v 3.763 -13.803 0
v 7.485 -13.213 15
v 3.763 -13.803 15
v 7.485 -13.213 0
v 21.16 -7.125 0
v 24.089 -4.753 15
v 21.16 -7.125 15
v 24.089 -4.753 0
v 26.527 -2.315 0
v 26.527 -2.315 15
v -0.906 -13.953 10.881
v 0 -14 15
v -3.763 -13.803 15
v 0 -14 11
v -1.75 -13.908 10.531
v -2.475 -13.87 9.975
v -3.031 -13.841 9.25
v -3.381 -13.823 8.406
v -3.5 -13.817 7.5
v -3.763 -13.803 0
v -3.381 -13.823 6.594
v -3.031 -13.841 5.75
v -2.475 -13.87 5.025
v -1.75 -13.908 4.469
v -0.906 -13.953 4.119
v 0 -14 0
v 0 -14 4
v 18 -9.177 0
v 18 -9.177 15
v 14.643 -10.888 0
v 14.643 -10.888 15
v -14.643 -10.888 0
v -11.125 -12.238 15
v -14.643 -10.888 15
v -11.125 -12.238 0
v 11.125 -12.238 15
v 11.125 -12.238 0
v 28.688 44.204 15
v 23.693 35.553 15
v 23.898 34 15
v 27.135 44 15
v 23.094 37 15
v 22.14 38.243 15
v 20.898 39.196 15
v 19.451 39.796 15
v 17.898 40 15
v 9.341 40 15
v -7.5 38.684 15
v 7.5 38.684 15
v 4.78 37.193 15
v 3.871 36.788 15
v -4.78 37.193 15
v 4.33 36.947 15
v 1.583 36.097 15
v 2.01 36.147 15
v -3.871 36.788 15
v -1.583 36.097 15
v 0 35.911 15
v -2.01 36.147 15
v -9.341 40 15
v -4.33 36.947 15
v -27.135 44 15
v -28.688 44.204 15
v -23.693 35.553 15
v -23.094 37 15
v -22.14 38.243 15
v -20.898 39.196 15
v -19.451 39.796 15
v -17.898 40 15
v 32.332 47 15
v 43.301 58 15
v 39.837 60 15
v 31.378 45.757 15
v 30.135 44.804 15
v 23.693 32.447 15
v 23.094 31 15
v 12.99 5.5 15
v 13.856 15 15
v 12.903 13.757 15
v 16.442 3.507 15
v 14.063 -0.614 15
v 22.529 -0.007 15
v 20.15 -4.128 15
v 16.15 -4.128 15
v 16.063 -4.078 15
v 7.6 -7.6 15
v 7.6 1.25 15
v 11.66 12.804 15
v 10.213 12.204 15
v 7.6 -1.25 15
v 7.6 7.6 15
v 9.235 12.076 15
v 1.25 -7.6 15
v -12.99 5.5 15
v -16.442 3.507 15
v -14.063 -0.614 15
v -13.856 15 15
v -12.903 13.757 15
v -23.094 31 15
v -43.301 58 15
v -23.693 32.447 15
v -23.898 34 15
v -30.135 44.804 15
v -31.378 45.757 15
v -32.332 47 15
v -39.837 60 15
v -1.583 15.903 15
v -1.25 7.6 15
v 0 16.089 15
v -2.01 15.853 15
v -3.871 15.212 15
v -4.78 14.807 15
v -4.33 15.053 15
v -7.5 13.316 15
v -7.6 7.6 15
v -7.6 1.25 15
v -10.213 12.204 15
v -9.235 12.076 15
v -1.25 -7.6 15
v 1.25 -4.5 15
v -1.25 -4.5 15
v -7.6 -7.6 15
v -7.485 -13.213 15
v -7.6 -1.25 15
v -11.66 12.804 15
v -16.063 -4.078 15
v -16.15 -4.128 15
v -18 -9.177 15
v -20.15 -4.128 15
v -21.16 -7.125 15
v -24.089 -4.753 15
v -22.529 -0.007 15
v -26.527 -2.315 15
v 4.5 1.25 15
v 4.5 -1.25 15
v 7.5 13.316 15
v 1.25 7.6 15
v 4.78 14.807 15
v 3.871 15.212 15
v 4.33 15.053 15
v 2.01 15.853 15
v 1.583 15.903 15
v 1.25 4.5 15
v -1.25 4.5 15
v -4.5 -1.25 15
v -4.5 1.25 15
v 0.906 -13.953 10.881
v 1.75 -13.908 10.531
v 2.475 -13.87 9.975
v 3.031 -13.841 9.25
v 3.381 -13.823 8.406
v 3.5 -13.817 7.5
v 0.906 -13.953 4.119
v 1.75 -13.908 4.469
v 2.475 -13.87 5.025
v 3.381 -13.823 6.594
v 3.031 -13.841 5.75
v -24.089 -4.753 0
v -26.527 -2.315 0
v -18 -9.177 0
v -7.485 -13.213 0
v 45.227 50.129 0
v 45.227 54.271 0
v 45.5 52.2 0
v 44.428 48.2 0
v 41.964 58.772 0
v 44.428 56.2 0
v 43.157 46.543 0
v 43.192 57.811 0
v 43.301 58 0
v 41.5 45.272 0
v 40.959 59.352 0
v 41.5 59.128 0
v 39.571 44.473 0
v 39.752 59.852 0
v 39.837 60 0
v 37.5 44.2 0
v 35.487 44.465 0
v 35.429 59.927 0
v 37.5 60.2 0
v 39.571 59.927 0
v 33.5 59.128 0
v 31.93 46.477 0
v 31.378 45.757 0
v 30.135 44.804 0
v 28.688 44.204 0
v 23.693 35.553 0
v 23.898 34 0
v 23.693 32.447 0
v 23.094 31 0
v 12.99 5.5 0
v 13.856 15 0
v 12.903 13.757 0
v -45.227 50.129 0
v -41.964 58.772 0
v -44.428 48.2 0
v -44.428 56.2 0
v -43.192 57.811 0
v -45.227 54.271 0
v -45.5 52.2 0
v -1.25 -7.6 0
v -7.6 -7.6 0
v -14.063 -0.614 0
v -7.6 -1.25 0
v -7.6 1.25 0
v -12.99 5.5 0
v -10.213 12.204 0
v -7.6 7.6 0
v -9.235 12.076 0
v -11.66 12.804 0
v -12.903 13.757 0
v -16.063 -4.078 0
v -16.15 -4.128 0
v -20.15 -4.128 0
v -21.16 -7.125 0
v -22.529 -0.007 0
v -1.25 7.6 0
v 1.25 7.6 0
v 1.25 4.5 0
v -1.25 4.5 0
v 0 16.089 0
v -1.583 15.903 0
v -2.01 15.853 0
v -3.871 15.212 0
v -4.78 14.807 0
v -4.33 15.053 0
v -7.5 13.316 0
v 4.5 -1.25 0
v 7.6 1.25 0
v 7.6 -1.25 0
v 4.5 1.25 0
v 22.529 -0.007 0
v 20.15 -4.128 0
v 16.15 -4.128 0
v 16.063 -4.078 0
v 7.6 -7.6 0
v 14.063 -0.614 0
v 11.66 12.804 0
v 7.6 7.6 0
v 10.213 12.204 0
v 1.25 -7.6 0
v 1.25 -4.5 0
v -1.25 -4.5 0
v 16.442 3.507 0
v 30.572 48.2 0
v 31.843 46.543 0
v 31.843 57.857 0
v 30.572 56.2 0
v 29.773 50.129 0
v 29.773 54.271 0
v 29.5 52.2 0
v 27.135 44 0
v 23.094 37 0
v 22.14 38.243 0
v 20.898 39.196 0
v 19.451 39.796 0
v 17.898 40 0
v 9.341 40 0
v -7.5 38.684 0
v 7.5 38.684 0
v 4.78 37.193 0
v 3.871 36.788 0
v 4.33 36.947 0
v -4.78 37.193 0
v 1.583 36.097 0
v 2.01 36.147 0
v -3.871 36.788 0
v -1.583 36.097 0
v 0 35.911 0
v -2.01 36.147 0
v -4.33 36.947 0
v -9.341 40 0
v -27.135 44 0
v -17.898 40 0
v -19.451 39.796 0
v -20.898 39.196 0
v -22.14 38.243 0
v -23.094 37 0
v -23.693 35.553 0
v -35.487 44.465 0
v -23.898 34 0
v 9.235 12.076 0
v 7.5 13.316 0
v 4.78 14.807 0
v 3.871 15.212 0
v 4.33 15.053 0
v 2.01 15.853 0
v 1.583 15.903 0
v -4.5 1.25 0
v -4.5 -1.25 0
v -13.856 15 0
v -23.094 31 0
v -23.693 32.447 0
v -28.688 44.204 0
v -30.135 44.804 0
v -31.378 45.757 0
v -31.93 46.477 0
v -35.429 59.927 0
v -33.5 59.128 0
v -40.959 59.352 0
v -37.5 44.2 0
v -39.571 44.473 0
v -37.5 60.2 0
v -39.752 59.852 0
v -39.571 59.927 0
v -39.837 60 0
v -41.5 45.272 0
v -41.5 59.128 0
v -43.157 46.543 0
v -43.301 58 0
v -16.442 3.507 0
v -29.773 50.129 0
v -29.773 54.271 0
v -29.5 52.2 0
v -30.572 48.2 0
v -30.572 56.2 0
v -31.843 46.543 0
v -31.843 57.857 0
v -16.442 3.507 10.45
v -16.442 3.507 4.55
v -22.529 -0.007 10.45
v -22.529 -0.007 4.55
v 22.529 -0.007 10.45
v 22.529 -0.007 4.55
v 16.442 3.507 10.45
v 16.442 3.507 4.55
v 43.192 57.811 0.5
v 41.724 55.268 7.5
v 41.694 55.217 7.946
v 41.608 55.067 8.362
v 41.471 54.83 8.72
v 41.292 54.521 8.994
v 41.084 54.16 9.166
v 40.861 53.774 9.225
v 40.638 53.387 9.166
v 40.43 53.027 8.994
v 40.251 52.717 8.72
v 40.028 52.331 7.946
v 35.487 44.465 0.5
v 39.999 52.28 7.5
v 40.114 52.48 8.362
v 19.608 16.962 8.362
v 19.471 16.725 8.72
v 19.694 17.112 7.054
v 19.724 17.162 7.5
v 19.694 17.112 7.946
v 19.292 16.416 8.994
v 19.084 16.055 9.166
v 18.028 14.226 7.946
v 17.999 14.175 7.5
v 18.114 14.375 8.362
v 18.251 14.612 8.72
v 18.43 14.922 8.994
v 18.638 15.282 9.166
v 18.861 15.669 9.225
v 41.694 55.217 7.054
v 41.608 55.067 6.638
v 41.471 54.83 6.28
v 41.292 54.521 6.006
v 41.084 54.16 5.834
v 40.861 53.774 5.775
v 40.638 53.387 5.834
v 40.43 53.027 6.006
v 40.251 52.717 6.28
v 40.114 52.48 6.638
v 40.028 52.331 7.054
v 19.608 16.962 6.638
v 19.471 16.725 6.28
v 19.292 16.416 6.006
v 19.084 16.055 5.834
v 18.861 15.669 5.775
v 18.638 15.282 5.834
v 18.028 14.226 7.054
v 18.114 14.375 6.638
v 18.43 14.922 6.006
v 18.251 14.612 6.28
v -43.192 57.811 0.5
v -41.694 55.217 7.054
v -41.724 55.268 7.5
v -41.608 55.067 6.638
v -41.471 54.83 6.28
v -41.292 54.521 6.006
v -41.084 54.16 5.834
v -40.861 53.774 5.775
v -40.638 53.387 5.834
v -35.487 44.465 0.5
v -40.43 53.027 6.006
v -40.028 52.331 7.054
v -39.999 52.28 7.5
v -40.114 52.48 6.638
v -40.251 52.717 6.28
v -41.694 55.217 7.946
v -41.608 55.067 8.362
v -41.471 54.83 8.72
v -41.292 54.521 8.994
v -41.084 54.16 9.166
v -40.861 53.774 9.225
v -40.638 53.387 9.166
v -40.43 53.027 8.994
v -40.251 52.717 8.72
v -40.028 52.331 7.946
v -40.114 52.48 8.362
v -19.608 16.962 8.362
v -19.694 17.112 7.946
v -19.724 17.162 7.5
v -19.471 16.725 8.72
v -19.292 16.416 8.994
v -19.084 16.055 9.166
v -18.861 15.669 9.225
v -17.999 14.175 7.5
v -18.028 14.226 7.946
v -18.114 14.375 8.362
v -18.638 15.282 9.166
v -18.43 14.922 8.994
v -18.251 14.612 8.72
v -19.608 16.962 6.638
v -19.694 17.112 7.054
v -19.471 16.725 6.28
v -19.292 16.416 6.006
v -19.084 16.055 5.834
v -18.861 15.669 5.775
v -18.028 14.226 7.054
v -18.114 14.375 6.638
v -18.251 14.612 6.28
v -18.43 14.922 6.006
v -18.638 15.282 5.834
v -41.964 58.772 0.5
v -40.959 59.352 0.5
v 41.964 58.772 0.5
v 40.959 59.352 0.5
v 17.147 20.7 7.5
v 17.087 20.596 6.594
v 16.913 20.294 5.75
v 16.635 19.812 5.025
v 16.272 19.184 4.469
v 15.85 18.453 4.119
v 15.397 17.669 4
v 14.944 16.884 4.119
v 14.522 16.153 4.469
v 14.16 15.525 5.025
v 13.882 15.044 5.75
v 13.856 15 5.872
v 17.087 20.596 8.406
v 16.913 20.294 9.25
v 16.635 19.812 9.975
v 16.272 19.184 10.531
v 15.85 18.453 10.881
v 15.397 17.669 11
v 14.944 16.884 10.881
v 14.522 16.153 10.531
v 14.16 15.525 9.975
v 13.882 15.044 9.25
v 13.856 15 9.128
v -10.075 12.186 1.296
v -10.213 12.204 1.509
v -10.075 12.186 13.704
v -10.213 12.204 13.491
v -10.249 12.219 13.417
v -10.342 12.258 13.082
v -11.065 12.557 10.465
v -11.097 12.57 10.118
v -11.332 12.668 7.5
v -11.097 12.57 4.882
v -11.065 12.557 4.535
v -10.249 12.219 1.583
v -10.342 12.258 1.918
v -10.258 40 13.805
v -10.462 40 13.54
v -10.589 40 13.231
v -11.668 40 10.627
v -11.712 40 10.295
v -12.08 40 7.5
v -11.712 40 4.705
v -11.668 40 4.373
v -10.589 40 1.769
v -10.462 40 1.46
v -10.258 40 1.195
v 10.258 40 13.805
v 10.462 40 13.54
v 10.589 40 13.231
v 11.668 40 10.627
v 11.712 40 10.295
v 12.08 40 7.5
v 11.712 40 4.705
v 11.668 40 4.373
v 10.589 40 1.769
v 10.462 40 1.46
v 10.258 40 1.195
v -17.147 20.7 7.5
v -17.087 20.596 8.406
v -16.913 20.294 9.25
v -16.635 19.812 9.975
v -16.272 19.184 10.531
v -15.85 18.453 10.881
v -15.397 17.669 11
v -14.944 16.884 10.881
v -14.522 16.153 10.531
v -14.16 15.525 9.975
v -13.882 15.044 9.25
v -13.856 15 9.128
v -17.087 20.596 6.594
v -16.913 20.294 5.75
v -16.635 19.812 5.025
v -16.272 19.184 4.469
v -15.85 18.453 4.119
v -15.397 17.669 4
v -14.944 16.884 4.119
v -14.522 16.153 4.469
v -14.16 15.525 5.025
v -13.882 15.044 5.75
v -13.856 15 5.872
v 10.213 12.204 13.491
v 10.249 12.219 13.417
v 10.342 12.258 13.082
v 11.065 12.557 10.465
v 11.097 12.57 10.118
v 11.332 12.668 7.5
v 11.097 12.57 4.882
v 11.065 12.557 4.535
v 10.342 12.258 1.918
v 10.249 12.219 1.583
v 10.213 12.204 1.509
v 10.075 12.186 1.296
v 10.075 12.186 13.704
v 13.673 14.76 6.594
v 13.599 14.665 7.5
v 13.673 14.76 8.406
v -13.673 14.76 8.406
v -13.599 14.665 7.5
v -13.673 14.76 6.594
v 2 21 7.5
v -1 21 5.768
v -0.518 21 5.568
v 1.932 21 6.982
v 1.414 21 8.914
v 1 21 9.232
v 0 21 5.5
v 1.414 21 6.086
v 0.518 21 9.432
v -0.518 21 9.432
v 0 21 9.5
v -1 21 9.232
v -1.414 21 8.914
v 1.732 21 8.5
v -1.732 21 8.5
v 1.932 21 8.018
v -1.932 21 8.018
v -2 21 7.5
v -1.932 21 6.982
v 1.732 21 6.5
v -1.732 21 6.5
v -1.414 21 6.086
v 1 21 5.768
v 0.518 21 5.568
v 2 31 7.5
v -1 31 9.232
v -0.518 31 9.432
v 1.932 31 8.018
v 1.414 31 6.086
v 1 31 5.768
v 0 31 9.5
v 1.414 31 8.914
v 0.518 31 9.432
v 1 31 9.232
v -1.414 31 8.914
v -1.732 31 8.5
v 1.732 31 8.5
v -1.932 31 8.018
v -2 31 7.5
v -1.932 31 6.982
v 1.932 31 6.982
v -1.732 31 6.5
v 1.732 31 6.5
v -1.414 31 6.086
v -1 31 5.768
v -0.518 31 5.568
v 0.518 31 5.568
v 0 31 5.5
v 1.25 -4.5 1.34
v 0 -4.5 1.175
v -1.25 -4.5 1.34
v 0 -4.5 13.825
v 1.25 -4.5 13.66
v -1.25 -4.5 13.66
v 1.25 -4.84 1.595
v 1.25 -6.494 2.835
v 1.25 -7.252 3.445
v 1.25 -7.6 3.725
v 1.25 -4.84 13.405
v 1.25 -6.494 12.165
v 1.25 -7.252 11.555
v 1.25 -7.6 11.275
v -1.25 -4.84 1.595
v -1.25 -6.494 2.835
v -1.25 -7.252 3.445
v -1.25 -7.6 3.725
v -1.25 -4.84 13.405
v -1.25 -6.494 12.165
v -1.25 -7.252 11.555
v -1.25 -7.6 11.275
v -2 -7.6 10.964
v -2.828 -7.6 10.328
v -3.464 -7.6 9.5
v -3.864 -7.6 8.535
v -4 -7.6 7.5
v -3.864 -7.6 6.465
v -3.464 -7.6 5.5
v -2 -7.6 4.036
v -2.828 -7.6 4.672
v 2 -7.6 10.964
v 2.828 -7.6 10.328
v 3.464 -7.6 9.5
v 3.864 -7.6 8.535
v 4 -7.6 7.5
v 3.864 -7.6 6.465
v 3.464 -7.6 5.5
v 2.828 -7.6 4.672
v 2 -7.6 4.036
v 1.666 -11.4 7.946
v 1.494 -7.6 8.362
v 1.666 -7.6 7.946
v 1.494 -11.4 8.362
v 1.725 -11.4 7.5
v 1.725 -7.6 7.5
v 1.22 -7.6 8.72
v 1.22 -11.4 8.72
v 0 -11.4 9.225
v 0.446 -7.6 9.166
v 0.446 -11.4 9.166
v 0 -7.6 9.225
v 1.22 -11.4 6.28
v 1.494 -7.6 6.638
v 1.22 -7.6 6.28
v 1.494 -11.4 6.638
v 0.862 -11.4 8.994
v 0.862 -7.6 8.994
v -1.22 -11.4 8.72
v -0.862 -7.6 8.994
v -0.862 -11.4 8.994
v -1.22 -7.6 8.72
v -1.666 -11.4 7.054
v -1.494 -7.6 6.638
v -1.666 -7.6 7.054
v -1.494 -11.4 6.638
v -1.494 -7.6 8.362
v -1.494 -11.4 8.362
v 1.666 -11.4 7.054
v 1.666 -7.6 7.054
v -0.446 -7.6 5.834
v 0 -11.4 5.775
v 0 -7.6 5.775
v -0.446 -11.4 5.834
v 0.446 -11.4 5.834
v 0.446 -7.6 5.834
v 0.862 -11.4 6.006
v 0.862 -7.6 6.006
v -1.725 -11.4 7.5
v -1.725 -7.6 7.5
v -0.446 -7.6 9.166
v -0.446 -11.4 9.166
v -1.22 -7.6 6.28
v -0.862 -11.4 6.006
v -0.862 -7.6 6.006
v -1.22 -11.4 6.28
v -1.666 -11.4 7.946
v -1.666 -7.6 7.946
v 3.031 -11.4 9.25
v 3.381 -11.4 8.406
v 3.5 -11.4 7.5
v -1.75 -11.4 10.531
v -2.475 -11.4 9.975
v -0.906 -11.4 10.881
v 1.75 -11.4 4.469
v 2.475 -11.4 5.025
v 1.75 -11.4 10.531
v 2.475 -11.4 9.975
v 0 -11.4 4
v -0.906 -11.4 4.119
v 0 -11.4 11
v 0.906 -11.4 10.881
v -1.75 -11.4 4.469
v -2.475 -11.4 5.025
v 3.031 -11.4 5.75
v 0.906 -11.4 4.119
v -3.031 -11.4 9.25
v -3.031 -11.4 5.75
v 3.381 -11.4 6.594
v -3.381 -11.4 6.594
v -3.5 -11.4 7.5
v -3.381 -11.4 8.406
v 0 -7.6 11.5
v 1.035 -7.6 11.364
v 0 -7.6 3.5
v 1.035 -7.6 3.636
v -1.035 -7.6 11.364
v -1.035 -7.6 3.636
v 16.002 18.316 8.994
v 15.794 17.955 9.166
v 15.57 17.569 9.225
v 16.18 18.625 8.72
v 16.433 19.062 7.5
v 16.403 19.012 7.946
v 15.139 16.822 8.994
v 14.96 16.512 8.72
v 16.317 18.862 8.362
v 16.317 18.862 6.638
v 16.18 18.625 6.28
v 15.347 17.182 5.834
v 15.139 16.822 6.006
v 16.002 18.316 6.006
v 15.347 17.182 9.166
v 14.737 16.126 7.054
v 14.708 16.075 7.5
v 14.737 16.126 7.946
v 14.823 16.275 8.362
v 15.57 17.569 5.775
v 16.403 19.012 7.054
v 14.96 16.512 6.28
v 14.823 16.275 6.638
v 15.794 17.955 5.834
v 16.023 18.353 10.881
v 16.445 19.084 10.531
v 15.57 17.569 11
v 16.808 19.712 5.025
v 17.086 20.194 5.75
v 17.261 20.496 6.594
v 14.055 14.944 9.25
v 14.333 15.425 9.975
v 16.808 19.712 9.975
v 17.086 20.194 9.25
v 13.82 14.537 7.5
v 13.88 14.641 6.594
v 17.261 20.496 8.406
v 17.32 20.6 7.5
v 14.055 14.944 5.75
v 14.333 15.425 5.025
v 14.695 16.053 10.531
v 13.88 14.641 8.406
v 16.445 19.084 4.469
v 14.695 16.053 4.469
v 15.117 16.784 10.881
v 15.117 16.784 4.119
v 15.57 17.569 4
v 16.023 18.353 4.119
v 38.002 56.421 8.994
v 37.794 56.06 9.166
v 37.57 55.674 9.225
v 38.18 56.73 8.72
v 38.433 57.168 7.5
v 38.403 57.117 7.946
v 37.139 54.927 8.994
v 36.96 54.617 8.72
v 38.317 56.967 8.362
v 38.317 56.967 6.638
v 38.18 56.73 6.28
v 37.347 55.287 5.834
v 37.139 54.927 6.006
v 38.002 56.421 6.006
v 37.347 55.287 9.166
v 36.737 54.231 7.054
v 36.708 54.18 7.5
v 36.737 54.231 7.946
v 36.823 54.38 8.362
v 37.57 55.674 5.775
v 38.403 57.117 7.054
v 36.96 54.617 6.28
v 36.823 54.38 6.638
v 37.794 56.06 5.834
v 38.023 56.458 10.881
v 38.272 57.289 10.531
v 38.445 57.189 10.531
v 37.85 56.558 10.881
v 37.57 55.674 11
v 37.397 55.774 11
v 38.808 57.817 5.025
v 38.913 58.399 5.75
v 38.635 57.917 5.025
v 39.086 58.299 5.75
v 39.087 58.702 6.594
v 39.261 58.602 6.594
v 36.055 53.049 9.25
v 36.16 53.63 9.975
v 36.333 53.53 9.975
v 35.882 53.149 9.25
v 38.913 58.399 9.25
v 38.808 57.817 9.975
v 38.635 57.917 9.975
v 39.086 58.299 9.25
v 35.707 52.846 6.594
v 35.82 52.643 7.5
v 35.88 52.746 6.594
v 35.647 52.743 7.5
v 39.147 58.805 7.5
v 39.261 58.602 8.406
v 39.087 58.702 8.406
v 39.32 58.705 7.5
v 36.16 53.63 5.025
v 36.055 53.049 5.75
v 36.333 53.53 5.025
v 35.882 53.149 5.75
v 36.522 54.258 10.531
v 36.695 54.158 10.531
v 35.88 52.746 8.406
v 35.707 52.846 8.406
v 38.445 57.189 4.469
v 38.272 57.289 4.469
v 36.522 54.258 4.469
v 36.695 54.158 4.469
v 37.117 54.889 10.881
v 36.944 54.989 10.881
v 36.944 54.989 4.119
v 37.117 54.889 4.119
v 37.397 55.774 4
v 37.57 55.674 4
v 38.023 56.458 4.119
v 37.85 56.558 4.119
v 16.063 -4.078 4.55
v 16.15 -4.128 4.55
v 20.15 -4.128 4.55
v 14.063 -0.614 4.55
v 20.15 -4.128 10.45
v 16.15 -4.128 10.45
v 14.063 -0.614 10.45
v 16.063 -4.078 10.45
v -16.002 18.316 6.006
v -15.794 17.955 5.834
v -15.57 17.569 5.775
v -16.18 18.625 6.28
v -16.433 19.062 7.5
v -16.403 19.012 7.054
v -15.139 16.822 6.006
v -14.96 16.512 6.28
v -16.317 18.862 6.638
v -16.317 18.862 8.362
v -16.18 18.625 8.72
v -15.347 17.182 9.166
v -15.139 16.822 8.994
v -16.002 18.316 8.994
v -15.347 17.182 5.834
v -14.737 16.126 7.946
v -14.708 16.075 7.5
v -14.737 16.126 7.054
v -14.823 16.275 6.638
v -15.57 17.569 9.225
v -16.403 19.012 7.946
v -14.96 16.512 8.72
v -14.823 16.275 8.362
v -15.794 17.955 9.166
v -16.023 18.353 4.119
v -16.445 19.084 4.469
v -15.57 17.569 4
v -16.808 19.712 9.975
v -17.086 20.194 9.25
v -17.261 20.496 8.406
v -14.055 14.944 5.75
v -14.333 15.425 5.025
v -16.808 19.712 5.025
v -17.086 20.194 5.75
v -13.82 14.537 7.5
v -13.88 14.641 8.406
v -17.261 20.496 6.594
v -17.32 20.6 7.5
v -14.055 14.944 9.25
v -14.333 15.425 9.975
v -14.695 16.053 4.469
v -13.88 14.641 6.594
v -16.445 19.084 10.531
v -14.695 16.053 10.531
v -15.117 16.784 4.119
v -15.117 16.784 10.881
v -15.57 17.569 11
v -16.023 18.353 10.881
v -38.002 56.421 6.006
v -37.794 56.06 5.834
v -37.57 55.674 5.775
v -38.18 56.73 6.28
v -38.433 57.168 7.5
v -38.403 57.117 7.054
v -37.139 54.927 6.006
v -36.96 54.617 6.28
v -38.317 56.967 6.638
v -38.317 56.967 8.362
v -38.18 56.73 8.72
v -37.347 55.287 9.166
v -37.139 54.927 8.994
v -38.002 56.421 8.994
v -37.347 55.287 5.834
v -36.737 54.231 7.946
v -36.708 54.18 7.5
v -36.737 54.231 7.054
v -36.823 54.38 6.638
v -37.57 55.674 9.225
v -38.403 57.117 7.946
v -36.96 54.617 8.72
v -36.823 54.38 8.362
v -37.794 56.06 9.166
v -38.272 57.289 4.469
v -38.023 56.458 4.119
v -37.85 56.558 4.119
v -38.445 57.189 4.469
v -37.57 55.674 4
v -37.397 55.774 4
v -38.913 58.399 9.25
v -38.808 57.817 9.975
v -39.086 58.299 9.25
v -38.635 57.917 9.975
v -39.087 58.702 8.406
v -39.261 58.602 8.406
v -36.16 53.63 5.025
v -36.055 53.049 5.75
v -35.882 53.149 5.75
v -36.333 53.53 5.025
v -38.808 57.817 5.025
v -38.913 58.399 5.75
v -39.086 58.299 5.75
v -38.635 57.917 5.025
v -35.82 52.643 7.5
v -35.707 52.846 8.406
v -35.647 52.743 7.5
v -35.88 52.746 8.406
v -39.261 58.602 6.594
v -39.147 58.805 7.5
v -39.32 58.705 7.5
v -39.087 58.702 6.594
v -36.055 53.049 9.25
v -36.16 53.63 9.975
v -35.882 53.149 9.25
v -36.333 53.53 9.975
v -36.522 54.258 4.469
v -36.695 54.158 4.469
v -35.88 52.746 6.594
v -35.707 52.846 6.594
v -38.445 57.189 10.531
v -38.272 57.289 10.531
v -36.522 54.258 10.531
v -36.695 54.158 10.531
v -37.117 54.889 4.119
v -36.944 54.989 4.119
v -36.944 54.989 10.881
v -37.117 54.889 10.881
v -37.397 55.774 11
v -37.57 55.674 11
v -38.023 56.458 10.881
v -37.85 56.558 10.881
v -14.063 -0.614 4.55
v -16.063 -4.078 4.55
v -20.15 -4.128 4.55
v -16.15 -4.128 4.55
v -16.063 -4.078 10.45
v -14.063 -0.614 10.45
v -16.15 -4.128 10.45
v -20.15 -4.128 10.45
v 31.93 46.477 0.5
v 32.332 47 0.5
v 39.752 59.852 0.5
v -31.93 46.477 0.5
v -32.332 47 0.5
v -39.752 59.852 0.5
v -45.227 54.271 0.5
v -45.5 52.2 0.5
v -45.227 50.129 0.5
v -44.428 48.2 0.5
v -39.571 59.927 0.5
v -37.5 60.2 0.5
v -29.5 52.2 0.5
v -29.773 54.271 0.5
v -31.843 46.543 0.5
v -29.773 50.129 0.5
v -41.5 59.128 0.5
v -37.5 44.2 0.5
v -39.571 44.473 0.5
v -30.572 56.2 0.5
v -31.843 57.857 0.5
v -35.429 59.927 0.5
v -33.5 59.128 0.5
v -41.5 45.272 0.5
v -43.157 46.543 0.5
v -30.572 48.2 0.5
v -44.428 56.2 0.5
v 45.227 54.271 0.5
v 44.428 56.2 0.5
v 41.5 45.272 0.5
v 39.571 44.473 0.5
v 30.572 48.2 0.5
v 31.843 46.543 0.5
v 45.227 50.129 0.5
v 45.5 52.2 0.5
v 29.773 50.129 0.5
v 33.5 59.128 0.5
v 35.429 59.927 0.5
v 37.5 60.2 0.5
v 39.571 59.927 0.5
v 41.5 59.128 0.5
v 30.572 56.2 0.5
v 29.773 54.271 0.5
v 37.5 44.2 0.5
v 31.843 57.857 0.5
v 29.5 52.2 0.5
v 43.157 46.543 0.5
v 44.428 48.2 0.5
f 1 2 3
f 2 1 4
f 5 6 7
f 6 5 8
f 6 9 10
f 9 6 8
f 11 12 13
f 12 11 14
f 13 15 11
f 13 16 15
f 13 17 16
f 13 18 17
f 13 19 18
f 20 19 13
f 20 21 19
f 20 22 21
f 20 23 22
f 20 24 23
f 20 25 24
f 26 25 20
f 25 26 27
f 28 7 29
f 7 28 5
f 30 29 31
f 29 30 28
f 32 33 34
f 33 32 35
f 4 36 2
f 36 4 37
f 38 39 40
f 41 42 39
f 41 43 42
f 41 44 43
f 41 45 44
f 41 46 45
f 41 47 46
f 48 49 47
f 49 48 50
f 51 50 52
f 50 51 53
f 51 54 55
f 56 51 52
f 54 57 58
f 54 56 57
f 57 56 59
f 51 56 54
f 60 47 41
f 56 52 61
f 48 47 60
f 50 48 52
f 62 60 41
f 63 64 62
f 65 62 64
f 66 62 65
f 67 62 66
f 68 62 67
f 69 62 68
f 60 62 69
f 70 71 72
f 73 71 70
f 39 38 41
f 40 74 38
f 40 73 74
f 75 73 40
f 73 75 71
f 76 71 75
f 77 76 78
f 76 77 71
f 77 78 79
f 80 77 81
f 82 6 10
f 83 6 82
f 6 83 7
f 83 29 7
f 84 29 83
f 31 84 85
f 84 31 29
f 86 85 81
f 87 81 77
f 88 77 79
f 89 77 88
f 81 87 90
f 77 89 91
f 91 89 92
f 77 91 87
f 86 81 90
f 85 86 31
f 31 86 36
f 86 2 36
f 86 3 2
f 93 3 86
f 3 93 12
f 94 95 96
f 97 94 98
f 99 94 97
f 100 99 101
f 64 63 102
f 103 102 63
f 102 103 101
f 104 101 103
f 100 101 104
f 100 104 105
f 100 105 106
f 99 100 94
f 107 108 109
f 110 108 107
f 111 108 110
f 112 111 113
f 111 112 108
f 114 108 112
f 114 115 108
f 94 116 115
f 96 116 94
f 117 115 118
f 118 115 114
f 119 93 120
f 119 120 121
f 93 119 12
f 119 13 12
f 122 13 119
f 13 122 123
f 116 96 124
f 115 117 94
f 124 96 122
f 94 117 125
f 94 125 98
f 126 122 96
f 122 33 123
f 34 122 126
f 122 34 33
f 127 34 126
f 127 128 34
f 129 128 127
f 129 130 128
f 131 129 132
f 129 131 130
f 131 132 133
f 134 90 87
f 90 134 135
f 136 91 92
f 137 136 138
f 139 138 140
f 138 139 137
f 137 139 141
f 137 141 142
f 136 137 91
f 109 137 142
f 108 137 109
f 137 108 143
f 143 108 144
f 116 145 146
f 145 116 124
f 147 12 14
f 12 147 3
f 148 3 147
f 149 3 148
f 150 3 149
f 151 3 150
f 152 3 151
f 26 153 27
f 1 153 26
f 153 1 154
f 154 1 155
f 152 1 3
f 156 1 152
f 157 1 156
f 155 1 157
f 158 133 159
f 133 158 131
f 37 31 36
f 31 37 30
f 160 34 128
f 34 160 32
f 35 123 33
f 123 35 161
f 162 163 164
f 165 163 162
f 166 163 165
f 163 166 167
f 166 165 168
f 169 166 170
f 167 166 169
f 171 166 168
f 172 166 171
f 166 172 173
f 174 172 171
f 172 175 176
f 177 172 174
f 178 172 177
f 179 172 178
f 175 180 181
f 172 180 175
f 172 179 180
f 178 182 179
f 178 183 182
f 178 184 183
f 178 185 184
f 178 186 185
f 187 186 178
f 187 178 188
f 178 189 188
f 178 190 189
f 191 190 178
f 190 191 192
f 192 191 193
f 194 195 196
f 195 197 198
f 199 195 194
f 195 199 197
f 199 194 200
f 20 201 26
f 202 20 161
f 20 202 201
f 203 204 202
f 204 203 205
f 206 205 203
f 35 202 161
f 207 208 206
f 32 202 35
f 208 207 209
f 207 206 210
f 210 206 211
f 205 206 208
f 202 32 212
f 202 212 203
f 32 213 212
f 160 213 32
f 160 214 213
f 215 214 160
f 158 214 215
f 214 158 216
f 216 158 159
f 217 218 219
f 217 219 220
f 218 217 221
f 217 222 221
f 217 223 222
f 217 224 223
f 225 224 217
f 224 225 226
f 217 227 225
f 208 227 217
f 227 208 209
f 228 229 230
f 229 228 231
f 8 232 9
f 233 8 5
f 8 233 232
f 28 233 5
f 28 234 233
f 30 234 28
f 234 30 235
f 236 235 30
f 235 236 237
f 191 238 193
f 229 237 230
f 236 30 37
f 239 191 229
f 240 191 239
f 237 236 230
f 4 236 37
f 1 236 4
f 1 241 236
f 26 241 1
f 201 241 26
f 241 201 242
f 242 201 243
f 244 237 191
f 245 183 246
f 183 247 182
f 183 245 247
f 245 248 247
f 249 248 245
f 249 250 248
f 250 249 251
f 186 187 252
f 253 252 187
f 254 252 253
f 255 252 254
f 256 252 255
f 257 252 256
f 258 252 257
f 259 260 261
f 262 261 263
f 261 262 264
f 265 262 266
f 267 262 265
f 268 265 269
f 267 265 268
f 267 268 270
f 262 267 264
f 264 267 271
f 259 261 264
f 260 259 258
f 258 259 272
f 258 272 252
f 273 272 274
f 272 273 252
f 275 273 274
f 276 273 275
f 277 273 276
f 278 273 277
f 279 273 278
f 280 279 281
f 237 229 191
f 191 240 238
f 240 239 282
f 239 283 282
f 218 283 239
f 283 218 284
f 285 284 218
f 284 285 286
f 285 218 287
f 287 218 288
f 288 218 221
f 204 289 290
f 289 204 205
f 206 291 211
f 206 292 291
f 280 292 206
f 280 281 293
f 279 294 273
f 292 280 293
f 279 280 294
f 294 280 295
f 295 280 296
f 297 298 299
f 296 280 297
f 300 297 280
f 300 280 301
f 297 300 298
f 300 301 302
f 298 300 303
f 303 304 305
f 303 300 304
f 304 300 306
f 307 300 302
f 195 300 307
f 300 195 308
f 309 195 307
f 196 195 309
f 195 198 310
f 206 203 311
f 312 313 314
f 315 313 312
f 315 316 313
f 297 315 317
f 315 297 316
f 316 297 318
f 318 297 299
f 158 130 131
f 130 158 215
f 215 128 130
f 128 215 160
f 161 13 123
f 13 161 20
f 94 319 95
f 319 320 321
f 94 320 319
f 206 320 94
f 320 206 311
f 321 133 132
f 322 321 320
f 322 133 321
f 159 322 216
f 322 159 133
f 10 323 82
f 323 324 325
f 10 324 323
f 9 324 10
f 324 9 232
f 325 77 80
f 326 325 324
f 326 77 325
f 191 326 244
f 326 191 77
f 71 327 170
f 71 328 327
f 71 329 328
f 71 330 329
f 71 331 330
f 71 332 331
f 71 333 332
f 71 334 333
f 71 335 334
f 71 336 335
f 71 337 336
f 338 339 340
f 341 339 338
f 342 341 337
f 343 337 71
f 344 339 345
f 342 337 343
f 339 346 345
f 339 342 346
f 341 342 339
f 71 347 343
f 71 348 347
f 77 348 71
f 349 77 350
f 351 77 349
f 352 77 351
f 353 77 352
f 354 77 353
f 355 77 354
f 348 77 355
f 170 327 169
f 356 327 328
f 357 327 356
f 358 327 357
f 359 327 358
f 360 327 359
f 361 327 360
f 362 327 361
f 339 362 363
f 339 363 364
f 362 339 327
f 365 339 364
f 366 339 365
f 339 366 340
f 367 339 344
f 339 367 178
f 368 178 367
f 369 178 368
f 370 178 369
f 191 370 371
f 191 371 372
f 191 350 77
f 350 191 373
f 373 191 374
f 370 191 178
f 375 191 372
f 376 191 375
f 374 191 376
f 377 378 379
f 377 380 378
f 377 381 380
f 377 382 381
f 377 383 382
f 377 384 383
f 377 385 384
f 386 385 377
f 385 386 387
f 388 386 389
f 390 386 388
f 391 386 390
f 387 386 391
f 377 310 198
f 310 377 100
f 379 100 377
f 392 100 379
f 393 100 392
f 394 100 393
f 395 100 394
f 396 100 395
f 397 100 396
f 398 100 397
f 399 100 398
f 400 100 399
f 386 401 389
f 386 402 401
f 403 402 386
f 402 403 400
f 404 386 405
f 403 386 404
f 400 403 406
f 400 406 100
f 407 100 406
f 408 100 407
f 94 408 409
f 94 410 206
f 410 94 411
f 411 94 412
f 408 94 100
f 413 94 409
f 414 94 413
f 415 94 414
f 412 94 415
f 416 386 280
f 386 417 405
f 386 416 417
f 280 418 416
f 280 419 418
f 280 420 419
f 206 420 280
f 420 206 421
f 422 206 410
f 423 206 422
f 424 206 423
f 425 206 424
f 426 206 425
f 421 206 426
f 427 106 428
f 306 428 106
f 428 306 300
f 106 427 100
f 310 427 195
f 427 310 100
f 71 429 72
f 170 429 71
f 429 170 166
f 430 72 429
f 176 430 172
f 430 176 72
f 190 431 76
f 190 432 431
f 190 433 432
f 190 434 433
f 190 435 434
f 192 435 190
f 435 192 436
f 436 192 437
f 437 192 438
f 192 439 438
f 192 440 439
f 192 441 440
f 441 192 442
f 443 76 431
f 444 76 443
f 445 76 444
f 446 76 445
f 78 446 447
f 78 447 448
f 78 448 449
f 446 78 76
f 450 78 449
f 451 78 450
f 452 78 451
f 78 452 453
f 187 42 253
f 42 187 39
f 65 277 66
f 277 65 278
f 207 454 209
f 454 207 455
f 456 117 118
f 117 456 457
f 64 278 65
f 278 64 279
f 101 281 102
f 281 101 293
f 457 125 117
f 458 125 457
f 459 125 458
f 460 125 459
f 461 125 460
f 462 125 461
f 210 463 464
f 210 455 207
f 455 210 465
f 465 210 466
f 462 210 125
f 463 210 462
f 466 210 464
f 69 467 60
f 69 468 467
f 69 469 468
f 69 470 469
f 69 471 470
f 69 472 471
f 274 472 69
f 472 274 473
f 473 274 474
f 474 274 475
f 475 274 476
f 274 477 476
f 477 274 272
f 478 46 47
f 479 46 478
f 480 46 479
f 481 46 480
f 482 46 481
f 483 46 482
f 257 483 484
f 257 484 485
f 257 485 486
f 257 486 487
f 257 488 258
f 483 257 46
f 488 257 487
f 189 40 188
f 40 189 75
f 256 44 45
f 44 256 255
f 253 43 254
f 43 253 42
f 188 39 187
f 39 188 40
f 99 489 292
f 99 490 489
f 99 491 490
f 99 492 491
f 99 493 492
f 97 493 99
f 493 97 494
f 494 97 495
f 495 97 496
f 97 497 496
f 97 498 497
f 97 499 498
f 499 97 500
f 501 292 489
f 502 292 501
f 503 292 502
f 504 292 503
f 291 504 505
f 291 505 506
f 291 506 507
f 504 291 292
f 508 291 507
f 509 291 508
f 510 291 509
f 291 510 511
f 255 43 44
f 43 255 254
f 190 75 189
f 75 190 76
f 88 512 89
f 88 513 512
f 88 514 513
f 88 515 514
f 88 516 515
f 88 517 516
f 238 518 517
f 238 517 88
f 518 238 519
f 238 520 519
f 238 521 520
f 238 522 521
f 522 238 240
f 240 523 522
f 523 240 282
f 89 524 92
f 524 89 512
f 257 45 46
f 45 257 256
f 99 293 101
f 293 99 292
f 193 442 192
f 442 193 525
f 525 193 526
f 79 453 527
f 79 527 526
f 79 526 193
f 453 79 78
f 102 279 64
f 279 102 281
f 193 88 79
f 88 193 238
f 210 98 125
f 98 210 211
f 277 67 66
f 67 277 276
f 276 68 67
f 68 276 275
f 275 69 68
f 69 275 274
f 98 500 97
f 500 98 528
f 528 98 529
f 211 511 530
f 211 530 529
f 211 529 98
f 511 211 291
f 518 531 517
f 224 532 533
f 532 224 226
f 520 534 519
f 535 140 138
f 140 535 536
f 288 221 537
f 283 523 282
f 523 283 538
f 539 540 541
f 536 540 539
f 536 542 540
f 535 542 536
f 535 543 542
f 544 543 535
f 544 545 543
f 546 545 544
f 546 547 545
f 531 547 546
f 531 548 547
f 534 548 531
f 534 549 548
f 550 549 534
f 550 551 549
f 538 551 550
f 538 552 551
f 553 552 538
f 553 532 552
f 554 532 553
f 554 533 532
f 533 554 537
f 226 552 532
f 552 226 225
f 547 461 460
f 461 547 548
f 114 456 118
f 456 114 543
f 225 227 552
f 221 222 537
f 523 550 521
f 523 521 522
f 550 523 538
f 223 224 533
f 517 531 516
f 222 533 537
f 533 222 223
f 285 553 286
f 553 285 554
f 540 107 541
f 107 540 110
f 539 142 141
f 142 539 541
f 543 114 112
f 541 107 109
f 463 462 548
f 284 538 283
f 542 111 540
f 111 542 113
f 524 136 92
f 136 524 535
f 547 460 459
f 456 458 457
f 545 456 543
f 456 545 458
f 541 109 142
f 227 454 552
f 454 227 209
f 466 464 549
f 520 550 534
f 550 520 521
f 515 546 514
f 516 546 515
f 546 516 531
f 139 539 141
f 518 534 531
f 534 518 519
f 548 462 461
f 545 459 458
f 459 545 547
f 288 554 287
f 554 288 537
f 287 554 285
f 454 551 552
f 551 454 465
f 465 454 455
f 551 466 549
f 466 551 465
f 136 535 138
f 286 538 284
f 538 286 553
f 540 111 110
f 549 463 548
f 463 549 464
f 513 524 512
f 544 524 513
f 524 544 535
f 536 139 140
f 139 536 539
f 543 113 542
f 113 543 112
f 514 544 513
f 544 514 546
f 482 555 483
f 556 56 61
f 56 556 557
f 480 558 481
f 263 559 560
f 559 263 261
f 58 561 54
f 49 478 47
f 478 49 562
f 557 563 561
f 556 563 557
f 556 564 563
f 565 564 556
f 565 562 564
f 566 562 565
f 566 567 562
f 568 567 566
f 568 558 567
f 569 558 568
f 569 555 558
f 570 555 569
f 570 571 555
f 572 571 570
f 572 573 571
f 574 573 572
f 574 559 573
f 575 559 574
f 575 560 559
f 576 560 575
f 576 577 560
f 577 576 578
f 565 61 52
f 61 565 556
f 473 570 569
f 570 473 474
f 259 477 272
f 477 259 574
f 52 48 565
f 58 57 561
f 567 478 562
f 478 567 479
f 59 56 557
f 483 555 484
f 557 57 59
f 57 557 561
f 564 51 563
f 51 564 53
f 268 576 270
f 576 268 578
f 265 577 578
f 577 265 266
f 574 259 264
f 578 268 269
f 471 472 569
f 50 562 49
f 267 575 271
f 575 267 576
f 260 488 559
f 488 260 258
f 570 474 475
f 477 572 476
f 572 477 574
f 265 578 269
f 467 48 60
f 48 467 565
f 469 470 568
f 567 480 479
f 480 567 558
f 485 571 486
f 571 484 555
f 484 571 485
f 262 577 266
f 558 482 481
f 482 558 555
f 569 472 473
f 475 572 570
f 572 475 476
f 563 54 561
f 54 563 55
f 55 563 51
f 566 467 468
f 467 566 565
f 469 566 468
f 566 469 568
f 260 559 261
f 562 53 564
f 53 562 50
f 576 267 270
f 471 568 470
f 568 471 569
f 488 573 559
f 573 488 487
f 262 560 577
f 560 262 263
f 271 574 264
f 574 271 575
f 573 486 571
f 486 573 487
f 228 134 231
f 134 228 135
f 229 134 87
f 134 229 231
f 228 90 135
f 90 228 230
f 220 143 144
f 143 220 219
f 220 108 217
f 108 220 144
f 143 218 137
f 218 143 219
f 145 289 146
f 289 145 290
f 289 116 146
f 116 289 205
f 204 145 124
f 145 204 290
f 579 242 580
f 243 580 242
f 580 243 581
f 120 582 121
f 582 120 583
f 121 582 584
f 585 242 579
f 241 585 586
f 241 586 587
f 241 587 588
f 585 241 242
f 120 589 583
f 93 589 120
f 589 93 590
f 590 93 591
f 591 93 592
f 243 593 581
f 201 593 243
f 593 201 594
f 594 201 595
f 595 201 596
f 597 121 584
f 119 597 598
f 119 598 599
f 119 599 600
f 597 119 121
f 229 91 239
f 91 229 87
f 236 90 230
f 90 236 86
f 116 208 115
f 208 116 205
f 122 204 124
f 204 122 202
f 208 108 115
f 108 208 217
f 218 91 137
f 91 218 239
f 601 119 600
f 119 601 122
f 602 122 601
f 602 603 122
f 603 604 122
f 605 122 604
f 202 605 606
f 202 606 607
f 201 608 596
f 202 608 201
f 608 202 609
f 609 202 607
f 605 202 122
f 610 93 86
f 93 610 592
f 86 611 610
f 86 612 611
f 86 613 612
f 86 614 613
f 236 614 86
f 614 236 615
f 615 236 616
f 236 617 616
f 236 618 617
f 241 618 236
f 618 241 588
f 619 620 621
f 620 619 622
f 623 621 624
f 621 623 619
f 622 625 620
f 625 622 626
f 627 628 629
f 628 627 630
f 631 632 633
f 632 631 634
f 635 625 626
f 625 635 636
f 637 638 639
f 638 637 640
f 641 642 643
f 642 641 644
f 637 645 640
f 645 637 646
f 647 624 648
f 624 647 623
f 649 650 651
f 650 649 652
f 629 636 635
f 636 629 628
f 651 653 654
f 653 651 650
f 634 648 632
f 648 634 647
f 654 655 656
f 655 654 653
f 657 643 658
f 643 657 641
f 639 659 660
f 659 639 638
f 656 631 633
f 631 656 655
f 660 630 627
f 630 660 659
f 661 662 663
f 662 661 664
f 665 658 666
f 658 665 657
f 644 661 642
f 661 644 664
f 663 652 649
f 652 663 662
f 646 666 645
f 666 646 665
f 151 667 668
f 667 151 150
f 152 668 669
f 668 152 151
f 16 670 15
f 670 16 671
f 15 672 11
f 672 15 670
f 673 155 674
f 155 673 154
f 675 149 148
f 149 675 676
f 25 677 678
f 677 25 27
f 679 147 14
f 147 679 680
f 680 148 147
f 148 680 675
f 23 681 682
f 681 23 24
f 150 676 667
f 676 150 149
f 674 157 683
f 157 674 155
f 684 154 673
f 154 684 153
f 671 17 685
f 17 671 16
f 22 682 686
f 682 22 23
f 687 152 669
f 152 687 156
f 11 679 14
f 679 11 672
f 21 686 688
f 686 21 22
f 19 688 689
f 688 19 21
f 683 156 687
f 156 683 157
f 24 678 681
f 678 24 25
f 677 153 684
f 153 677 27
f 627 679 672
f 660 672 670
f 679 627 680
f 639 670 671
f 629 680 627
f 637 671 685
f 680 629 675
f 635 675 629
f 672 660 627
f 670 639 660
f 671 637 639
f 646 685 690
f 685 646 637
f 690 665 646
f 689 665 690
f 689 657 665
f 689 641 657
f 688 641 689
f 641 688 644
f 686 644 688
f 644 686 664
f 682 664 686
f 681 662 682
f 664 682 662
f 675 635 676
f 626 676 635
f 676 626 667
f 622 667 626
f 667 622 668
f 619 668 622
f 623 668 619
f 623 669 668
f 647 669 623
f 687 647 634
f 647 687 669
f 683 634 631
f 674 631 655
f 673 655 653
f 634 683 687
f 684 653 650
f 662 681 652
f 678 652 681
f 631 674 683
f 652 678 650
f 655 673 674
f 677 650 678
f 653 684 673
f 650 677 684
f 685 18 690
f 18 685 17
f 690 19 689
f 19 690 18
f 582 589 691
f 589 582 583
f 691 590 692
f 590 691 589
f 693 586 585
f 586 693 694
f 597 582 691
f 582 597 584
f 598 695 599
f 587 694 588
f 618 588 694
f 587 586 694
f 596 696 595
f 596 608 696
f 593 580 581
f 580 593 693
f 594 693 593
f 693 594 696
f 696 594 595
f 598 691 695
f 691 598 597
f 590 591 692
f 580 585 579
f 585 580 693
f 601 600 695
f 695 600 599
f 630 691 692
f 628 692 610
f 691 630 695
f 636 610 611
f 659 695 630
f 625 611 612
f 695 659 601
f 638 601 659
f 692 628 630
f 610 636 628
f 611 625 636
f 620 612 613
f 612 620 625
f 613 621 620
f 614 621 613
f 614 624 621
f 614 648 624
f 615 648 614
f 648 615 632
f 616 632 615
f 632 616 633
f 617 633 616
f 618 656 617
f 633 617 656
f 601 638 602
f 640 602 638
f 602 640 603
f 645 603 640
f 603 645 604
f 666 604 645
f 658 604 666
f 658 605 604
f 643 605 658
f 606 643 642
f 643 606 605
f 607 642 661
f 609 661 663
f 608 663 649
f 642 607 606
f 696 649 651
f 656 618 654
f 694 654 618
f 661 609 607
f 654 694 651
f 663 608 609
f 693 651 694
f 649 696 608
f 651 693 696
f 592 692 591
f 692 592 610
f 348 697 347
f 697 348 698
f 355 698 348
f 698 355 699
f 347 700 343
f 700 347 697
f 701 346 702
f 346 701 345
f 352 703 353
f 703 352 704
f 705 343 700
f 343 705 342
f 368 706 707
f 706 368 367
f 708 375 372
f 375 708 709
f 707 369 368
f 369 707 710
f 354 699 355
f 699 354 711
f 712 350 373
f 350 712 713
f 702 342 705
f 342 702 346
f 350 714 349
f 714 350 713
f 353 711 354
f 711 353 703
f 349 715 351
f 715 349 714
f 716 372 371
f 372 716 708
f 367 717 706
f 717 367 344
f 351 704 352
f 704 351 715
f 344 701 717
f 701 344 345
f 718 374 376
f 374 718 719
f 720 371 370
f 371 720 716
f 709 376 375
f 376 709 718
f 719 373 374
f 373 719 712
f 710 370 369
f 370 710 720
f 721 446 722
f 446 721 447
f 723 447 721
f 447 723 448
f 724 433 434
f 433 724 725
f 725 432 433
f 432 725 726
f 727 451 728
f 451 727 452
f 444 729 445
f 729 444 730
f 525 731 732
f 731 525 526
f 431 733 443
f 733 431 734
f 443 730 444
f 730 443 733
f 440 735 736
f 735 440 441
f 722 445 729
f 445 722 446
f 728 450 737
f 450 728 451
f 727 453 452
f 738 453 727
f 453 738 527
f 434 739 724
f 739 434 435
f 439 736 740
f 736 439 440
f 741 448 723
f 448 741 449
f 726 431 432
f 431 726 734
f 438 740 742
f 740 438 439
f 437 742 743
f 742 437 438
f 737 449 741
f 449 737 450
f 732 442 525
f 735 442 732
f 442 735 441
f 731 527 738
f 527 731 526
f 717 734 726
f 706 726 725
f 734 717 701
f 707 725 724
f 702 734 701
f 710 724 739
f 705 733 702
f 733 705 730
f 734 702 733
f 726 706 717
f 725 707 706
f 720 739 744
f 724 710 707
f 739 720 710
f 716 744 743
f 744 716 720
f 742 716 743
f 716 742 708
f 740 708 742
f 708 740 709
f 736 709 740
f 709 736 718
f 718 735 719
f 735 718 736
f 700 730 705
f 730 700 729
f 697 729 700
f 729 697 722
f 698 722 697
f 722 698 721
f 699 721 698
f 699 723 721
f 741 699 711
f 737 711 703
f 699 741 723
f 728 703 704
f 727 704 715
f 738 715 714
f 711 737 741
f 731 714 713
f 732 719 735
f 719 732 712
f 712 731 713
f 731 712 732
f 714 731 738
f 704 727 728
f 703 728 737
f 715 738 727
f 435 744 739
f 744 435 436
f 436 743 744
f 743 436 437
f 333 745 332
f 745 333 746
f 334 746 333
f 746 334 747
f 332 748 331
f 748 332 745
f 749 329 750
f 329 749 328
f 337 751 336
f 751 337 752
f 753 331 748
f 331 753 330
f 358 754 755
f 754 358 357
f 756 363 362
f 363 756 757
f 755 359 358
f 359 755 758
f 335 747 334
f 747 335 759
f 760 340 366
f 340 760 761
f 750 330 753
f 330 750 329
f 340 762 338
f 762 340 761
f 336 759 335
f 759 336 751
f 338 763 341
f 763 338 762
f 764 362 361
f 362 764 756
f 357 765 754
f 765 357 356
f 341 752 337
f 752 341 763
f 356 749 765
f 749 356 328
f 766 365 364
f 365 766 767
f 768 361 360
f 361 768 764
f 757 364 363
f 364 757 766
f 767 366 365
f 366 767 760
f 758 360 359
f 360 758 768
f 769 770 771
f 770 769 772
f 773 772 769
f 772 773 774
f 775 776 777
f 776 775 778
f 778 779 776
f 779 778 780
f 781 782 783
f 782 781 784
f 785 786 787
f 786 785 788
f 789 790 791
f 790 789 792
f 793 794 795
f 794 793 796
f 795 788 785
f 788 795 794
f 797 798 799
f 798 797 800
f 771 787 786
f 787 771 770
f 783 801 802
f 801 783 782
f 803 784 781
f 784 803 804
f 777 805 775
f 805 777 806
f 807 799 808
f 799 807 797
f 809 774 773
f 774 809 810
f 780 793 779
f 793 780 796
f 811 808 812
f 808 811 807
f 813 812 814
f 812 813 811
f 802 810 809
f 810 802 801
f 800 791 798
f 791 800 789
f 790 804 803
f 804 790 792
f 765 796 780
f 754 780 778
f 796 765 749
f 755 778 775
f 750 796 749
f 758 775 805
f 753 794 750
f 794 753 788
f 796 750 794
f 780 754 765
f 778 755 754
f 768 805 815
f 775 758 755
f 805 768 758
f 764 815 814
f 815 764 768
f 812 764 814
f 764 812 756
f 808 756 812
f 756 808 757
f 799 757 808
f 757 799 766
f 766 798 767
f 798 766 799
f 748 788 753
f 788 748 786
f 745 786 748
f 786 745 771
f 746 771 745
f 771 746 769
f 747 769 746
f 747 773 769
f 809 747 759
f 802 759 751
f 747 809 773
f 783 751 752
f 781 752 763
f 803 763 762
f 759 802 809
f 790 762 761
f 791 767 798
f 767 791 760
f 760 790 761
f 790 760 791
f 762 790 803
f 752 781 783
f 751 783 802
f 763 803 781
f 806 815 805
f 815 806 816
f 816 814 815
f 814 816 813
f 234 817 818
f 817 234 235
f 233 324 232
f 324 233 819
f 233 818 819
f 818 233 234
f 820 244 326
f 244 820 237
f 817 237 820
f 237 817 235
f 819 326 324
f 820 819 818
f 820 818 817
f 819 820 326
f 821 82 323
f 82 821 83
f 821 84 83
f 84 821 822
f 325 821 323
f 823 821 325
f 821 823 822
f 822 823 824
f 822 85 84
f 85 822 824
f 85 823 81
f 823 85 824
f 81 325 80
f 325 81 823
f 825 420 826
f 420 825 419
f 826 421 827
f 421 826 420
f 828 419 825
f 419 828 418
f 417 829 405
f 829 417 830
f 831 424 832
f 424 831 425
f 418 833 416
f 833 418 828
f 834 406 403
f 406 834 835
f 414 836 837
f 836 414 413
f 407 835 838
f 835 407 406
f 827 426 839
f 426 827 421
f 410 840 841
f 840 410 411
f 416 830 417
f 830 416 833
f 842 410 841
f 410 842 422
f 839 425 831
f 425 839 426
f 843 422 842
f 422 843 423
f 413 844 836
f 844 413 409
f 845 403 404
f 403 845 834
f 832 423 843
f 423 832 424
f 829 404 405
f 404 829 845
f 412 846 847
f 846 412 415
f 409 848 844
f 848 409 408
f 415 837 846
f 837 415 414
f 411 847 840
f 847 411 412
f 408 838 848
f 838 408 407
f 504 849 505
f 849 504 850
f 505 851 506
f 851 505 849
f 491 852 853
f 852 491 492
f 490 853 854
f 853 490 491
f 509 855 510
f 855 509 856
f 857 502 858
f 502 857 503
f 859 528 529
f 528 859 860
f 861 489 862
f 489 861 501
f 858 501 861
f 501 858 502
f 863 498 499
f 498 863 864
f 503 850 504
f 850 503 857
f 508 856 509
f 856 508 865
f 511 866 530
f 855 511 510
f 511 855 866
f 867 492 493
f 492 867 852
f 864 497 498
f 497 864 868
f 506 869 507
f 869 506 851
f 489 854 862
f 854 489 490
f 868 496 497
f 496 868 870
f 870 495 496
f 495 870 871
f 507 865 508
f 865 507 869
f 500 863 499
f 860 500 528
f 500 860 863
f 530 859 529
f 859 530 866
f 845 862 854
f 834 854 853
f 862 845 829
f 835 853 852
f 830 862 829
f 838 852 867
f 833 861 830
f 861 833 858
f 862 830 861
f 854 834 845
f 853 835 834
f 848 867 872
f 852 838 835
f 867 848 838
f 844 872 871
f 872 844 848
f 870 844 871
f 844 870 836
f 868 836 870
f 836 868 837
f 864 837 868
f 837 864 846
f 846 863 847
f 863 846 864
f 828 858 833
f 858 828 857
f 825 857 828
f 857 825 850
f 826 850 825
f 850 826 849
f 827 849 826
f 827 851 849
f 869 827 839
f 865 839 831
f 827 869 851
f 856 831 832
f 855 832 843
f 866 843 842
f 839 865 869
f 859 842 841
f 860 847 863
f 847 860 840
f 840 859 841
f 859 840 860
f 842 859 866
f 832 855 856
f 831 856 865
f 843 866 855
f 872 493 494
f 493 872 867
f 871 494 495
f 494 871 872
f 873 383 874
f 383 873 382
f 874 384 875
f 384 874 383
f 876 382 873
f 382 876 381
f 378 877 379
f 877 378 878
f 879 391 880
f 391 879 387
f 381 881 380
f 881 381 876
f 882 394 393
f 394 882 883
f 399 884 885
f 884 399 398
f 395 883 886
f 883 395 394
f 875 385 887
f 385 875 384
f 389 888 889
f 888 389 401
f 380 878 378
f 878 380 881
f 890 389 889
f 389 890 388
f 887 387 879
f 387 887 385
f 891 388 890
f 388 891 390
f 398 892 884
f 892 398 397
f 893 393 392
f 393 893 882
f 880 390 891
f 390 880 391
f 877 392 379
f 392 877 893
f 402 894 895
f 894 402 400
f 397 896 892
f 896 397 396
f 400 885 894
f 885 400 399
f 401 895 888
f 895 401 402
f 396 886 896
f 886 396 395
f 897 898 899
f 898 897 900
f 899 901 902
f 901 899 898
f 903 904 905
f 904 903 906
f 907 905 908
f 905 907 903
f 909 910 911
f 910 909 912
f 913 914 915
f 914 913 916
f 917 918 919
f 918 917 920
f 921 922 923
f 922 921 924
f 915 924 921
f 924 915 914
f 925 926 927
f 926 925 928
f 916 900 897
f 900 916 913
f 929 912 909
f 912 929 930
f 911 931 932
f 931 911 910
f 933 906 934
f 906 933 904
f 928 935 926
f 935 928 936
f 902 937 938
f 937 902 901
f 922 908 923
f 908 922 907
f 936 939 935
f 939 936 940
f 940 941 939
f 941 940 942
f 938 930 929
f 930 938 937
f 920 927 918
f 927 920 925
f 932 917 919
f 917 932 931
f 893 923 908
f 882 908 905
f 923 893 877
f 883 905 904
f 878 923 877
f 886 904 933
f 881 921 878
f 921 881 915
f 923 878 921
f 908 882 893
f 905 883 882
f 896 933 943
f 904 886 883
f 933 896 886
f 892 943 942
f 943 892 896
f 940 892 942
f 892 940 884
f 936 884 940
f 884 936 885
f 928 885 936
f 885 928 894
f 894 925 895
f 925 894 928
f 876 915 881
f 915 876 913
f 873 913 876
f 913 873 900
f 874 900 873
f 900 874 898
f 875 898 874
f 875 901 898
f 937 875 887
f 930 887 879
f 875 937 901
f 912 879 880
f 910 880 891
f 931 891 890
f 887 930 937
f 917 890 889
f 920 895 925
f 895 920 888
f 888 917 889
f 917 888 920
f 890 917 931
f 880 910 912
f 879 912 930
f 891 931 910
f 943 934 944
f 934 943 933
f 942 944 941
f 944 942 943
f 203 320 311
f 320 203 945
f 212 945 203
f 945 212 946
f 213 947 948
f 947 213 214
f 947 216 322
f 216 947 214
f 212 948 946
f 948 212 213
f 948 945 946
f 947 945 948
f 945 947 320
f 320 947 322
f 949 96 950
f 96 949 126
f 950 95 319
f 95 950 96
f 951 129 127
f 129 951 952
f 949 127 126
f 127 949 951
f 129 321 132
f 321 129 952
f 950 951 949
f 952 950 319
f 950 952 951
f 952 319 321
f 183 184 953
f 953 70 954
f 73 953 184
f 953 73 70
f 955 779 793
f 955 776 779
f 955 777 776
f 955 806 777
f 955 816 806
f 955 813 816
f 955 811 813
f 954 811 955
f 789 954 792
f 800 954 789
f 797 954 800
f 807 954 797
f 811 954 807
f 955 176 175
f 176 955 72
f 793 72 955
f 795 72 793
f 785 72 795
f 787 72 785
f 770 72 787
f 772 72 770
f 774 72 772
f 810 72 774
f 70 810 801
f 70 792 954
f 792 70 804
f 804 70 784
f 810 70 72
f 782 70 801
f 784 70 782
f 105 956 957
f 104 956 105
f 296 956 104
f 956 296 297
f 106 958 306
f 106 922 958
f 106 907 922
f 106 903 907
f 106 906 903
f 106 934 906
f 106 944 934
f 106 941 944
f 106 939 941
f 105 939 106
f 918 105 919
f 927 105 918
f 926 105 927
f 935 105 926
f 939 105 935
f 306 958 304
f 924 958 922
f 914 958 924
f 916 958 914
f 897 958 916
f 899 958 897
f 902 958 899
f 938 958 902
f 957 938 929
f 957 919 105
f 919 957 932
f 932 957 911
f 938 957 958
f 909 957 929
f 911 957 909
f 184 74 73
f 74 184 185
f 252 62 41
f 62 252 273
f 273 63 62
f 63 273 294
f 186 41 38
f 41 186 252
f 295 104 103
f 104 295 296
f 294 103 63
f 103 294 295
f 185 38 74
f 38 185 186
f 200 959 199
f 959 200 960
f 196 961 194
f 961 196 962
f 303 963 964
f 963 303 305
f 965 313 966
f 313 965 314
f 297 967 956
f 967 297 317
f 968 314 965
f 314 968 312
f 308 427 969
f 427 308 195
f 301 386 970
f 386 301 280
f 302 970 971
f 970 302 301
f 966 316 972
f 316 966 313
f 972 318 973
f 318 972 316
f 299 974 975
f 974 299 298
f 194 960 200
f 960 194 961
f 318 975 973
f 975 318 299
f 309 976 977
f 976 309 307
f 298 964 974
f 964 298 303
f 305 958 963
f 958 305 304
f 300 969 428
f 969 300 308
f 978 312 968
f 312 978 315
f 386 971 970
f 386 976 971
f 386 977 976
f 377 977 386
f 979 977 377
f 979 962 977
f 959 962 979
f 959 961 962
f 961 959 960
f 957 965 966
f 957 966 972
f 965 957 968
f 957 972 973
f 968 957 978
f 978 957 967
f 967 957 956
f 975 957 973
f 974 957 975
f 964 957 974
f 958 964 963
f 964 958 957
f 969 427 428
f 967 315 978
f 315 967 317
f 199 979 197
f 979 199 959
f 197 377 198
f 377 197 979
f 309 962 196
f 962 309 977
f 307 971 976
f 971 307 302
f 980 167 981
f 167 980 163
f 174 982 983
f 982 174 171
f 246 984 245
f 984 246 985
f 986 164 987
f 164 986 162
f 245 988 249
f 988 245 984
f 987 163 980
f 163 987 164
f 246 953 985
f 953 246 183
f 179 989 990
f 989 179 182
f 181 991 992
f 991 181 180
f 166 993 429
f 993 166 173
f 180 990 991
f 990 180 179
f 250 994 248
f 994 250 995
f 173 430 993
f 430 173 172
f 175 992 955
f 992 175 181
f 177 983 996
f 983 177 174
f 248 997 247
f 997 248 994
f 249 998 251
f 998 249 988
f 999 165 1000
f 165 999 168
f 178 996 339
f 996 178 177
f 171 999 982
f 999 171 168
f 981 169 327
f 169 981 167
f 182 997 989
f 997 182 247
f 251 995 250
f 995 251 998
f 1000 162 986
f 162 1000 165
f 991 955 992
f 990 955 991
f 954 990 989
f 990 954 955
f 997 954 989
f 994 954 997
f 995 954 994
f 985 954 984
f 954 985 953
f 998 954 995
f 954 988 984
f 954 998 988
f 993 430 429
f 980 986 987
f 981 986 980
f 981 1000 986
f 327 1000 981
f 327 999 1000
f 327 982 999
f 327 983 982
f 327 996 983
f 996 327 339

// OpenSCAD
// file: configuration.scad
// Increase this if your slicer or printer make holes too tight.
extra_radius = 0.1;

// OD = outside diameter, corner to corner.
m3_nut_od = 6.1;
m3_nut_radius = m3_nut_od/2 + 0.2 + extra_radius;
m3_washer_radius = 3.5 + extra_radius;

// Major diameter of metric 3mm thread.
m3_major = 2.85;
m3_radius = m3_major/2 + extra_radius;
m3_wide_radius = m3_major/2 + extra_radius + 0.2;
// For M3 holes that needs to be tapped in the plastic
m3_tap_radius = 2.5/2 + extra_radius;

// NEMA17 stepper motors.
motor_shaft_diameter = 5;
motor_shaft_radius = motor_shaft_diameter/2 + extra_radius;

// Frame brackets. M3x8mm screws work best with 3.6 mm brackets.
thickness = 3.6;

// OpenBeam or Misumi. Currently only 15x15 mm, but there is a plan
// to make models more parametric and allow 20x20 mm in the future.
extrusion = 15;

// Placement for the NEMA17 stepper motors.
motor_offset = 44;
motor_length = 47;
// main file
include <configuration.scad>;

$fn = 24;
roundness = 6;

module extrusion_cutout(h, extra) {
  difference() {
    cube([extrusion+extra, extrusion+extra, h], center=true);
    for (a = [0:90:359]) rotate([0, 0, a]) {
      translate([extrusion/2, 0, 0])
        cube([6, 2.5, h+1], center=true);
    }
  }
}

module screw_socket() {
  cylinder(r=m3_wide_radius, h=20, center=true);
  translate([0, 0, 3.8]) cylinder(r=3.5, h=5);
}

module screw_socket_cone() {
  union() {
    screw_socket();
    scale([1, 1, -1]) cylinder(r1=4, r2=7, h=4);
  }
}

module vertex(height, idler_offset, idler_space) {
  union() {
    // Pads to improve print bed adhesion for slim ends.
    translate([-37.5, 52.2, -height/2]) cylinder(r=8, h=0.5);
    translate([37.5, 52.2, -height/2]) cylinder(r=8, h=0.5);
    difference() {
      union() {
        // Outer wedge form
        intersection() {
          translate([0, 22, 0])
            cylinder(r=36, h=height, center=true, $fn=60);
          translate([0, -37, 0]) rotate([0, 0, 30])
            cylinder(r=50, h=height+1, center=true, $fn=6);
        }
        // Inner triangle form
        translate([0, 38, 0]) intersection() {
          rotate([0, 0, -90])
            cylinder(r=55, h=height, center=true, $fn=3);
          translate([0, 10, 0])
            cube([100, 100, 2*height], center=true);
          translate([0, -10, 0]) rotate([0, 0, 30])
            cylinder(r=55, h=height+1, center=true, $fn=6);
        }
      }
      // Internal cutout where motor shaft/idler bearings sits.
      difference() {
        translate([0, 58, 0]) minkowski() {
          intersection() {
            rotate([0, 0, -90])
              cylinder(r=55, h=height, center=true, $fn=3);
            translate([0, -32, 0])
              cube([100, 16, 2*height], center=true);
          }
          cylinder(r=roundness, h=1, center=true);
        }
        // Idler support cones.
        translate([0, 26+idler_offset-30, 0]) rotate([-90, 0, 0])
          cylinder(r1=30, r2=2, h=30-idler_space/2);
        translate([0, 26+idler_offset+30, 0]) rotate([90, 0, 0])
          cylinder(r1=30, r2=2, h=30-idler_space/2);
      }
      // Cutout between internal "arms"
      translate([0, 58, 0]) minkowski() {
        intersection() {
          rotate([0, 0, -90])
            cylinder(r=55, h=height, center=true, $fn=3);
          translate([0, 7, 0])
            cube([100, 30, 2*height], center=true);
        }
        cylinder(r=roundness, h=1, center=true);
      }
      extrusion_cutout(height+10, 2*extra_radius);
      // All mounting and extrusion fitting holes
      for (z = [0:30:height]) {
        translate([0, -7.5-extra_radius, z+7.5-height/2]) rotate([90, 0, 0])
          screw_socket_cone();
        for (a = [-1, 1]) {
          rotate([0, 0, 30*a]) translate([-16*a, 111, z+7.5-height/2]) {
            // % rotate([90, 0, 0]) extrusion_cutout(200, 0);
            // Screw sockets.
            for (y = [-88, -44]) {
              translate([a*7.5, y, 0]) rotate([0, a*90, 0]) screw_socket();
            }
            // Nut tunnels.
            for (z = [-1, 1]) {
              scale([1, 1, z]) translate([0, -100, 3]) minkowski() {
                rotate([0, 0, -a*30]) cylinder(r=4, h=16, $fn=6);
                cube([0.1, 5, 0.1], center=true);
              }
            }
          }
        }
      }
    }
  }
}

translate([0, 0, 7.5]) vertex(15, idler_offset=0, idler_space=10);
